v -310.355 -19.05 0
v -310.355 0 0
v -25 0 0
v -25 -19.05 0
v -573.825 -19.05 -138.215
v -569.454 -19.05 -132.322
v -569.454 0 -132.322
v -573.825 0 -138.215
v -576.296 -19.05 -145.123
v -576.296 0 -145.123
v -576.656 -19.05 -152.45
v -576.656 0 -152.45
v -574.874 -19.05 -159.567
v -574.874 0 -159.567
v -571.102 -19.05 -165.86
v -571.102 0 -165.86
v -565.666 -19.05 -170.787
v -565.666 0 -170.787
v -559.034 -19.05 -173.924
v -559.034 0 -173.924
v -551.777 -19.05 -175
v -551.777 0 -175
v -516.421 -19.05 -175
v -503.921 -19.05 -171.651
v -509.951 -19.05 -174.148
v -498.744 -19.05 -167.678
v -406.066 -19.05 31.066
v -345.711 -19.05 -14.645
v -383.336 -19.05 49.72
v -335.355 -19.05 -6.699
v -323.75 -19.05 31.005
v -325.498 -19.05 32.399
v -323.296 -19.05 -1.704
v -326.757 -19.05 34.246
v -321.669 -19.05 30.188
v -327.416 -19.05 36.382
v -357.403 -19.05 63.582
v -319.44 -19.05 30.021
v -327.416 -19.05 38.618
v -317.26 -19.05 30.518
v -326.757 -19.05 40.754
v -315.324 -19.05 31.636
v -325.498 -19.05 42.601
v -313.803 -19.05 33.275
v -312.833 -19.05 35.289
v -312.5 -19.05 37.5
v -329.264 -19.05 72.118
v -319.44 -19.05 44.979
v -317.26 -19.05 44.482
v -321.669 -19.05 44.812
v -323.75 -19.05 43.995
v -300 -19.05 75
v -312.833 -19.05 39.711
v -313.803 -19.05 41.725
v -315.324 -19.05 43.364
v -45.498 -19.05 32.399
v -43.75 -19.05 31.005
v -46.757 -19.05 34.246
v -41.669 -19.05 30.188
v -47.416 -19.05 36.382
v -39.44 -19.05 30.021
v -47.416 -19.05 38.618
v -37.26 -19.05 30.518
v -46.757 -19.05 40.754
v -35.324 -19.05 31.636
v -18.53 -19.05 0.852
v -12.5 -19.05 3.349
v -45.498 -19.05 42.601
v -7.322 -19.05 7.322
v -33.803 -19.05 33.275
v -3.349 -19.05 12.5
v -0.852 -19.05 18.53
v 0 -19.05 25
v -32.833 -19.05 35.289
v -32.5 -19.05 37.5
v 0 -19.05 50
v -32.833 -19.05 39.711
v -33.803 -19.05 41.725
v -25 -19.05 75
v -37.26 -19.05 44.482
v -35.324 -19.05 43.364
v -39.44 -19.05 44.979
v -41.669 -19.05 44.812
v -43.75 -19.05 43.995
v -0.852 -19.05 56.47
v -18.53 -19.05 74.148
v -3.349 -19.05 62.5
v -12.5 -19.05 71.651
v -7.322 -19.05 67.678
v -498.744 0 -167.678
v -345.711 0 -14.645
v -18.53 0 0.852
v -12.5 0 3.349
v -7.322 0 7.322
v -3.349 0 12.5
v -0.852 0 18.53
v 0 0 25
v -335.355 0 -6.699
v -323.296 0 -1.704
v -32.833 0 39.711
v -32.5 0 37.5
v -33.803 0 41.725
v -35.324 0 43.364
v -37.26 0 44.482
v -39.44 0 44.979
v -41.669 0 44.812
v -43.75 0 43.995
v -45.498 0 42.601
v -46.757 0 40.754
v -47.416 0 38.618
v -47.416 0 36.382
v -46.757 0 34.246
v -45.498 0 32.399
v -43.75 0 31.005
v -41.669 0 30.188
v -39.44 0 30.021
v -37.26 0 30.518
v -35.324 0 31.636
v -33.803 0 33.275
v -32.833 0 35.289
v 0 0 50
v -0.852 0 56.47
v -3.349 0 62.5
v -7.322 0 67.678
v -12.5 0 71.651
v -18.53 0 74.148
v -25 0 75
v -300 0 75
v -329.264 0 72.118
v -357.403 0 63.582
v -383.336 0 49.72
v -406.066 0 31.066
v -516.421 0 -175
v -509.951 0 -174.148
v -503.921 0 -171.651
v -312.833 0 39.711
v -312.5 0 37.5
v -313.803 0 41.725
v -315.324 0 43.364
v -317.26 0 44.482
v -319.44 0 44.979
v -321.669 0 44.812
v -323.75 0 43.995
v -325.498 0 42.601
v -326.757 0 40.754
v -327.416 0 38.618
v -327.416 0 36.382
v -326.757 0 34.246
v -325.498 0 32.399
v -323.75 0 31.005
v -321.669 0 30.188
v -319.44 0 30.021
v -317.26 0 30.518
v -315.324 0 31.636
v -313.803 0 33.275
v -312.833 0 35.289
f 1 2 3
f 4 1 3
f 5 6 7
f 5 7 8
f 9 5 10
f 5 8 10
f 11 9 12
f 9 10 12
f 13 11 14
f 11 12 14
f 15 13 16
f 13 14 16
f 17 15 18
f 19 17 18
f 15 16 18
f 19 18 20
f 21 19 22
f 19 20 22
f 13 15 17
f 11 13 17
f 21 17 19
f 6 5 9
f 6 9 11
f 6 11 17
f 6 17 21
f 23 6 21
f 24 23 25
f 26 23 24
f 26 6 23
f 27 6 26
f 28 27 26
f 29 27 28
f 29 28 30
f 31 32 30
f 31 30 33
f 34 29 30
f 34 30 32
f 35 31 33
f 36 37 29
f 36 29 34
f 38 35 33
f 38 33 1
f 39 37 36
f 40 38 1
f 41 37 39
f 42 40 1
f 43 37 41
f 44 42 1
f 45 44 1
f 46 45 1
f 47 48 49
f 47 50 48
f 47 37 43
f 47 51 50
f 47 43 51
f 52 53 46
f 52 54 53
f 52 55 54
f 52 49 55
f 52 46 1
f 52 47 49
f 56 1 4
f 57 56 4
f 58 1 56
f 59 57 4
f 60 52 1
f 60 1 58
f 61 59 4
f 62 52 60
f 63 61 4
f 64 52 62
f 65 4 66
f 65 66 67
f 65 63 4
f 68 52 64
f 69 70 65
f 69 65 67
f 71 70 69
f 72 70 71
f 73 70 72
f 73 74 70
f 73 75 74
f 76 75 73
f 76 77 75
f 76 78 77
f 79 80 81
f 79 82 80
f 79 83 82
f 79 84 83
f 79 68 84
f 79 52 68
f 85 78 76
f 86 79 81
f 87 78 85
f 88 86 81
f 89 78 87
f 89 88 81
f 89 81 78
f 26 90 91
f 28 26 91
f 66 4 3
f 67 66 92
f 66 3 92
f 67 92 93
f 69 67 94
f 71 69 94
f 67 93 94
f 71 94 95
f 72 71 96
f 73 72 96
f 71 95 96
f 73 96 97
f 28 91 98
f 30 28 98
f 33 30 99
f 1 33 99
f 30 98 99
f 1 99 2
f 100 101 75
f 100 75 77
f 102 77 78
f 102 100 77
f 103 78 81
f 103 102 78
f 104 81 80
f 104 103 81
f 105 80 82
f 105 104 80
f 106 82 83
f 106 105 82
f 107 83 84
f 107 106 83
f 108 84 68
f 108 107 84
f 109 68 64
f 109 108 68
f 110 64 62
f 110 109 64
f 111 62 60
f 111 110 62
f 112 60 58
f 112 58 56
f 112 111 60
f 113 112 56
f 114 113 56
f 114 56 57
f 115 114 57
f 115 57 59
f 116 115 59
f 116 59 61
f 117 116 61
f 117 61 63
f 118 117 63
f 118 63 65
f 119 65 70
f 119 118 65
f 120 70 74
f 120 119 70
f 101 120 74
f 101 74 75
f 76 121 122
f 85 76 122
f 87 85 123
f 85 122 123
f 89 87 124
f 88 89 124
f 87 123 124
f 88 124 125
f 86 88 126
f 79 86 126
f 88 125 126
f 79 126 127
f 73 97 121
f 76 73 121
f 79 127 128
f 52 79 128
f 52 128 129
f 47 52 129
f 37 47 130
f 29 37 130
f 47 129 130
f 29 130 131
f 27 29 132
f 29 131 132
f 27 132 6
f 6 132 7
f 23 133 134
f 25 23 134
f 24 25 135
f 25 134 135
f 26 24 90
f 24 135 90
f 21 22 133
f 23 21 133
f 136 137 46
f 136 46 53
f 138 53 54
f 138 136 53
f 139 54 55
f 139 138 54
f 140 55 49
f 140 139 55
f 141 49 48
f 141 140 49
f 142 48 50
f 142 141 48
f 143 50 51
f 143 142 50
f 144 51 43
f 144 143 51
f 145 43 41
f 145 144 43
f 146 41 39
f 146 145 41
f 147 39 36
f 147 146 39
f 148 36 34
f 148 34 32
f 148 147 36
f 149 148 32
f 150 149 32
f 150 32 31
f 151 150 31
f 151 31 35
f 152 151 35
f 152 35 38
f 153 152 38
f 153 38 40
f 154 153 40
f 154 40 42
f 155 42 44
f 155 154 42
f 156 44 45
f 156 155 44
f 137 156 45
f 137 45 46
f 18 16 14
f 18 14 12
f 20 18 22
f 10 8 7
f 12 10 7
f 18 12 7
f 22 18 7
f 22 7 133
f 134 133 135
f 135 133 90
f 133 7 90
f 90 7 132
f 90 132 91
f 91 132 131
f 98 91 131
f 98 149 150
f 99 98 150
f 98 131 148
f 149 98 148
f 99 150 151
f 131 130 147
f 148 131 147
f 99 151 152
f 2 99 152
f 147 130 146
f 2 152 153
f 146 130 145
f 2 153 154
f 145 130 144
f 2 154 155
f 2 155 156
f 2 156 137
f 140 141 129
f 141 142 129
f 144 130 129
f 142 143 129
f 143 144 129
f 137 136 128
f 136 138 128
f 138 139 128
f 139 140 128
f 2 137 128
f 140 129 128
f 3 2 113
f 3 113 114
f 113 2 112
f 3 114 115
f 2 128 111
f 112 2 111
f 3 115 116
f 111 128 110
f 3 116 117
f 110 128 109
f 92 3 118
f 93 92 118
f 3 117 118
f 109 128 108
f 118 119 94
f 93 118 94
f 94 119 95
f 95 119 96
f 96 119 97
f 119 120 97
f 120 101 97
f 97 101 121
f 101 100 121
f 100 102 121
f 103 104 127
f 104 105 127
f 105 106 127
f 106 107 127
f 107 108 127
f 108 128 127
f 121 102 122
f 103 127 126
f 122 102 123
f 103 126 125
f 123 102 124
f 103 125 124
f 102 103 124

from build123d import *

# Parameters (mm, degrees)
F0_R     = 7.5
F1_DEPTH = 19.05


with BuildPart() as f1:
    # F0 (on Front) → F1 (new body)
    with BuildSketch(Plane.XZ):
        with BuildLine():
            ThreePointArc((-25, 0), (-7.32233, 7.32233), (0, 25))
            Line((0, 25), (0, 50))
            ThreePointArc((0, 50), (-7.32233, 67.67767), (-25, 75))
            Line((-25, 75), (-300, 75))
            ThreePointArc((-300, 75), (-357.402515, 63.58193), (-406.066017, 31.066017))
            Line((-406.066017, 31.066017), (-569.454365, -132.32233))
            ThreePointArc((-569.454365, -132.32233), (-574.873684, -159.567086), (-551.776695, -175))
            Line((-551.776695, -175), (-516.421356, -175))
            ThreePointArc((-516.421356, -175), (-506.85427, -173.096988), (-498.743687, -167.67767))
            Line((-498.743687, -167.67767), (-345.710678, -14.644661))
            ThreePointArc((-345.710678, -14.644661), (-329.489511, -3.806023), (-310.355339, 0))
            Line((-310.355339, 0), (-25, 0))
        make_face()
        with Locations((-320, 37.5)):
            Circle(F0_R, mode=Mode.SUBTRACT)
        with Locations((-40, 37.5)):
            Circle(F0_R, mode=Mode.SUBTRACT)
    extrude(amount=F1_DEPTH)


solid = f1.part
